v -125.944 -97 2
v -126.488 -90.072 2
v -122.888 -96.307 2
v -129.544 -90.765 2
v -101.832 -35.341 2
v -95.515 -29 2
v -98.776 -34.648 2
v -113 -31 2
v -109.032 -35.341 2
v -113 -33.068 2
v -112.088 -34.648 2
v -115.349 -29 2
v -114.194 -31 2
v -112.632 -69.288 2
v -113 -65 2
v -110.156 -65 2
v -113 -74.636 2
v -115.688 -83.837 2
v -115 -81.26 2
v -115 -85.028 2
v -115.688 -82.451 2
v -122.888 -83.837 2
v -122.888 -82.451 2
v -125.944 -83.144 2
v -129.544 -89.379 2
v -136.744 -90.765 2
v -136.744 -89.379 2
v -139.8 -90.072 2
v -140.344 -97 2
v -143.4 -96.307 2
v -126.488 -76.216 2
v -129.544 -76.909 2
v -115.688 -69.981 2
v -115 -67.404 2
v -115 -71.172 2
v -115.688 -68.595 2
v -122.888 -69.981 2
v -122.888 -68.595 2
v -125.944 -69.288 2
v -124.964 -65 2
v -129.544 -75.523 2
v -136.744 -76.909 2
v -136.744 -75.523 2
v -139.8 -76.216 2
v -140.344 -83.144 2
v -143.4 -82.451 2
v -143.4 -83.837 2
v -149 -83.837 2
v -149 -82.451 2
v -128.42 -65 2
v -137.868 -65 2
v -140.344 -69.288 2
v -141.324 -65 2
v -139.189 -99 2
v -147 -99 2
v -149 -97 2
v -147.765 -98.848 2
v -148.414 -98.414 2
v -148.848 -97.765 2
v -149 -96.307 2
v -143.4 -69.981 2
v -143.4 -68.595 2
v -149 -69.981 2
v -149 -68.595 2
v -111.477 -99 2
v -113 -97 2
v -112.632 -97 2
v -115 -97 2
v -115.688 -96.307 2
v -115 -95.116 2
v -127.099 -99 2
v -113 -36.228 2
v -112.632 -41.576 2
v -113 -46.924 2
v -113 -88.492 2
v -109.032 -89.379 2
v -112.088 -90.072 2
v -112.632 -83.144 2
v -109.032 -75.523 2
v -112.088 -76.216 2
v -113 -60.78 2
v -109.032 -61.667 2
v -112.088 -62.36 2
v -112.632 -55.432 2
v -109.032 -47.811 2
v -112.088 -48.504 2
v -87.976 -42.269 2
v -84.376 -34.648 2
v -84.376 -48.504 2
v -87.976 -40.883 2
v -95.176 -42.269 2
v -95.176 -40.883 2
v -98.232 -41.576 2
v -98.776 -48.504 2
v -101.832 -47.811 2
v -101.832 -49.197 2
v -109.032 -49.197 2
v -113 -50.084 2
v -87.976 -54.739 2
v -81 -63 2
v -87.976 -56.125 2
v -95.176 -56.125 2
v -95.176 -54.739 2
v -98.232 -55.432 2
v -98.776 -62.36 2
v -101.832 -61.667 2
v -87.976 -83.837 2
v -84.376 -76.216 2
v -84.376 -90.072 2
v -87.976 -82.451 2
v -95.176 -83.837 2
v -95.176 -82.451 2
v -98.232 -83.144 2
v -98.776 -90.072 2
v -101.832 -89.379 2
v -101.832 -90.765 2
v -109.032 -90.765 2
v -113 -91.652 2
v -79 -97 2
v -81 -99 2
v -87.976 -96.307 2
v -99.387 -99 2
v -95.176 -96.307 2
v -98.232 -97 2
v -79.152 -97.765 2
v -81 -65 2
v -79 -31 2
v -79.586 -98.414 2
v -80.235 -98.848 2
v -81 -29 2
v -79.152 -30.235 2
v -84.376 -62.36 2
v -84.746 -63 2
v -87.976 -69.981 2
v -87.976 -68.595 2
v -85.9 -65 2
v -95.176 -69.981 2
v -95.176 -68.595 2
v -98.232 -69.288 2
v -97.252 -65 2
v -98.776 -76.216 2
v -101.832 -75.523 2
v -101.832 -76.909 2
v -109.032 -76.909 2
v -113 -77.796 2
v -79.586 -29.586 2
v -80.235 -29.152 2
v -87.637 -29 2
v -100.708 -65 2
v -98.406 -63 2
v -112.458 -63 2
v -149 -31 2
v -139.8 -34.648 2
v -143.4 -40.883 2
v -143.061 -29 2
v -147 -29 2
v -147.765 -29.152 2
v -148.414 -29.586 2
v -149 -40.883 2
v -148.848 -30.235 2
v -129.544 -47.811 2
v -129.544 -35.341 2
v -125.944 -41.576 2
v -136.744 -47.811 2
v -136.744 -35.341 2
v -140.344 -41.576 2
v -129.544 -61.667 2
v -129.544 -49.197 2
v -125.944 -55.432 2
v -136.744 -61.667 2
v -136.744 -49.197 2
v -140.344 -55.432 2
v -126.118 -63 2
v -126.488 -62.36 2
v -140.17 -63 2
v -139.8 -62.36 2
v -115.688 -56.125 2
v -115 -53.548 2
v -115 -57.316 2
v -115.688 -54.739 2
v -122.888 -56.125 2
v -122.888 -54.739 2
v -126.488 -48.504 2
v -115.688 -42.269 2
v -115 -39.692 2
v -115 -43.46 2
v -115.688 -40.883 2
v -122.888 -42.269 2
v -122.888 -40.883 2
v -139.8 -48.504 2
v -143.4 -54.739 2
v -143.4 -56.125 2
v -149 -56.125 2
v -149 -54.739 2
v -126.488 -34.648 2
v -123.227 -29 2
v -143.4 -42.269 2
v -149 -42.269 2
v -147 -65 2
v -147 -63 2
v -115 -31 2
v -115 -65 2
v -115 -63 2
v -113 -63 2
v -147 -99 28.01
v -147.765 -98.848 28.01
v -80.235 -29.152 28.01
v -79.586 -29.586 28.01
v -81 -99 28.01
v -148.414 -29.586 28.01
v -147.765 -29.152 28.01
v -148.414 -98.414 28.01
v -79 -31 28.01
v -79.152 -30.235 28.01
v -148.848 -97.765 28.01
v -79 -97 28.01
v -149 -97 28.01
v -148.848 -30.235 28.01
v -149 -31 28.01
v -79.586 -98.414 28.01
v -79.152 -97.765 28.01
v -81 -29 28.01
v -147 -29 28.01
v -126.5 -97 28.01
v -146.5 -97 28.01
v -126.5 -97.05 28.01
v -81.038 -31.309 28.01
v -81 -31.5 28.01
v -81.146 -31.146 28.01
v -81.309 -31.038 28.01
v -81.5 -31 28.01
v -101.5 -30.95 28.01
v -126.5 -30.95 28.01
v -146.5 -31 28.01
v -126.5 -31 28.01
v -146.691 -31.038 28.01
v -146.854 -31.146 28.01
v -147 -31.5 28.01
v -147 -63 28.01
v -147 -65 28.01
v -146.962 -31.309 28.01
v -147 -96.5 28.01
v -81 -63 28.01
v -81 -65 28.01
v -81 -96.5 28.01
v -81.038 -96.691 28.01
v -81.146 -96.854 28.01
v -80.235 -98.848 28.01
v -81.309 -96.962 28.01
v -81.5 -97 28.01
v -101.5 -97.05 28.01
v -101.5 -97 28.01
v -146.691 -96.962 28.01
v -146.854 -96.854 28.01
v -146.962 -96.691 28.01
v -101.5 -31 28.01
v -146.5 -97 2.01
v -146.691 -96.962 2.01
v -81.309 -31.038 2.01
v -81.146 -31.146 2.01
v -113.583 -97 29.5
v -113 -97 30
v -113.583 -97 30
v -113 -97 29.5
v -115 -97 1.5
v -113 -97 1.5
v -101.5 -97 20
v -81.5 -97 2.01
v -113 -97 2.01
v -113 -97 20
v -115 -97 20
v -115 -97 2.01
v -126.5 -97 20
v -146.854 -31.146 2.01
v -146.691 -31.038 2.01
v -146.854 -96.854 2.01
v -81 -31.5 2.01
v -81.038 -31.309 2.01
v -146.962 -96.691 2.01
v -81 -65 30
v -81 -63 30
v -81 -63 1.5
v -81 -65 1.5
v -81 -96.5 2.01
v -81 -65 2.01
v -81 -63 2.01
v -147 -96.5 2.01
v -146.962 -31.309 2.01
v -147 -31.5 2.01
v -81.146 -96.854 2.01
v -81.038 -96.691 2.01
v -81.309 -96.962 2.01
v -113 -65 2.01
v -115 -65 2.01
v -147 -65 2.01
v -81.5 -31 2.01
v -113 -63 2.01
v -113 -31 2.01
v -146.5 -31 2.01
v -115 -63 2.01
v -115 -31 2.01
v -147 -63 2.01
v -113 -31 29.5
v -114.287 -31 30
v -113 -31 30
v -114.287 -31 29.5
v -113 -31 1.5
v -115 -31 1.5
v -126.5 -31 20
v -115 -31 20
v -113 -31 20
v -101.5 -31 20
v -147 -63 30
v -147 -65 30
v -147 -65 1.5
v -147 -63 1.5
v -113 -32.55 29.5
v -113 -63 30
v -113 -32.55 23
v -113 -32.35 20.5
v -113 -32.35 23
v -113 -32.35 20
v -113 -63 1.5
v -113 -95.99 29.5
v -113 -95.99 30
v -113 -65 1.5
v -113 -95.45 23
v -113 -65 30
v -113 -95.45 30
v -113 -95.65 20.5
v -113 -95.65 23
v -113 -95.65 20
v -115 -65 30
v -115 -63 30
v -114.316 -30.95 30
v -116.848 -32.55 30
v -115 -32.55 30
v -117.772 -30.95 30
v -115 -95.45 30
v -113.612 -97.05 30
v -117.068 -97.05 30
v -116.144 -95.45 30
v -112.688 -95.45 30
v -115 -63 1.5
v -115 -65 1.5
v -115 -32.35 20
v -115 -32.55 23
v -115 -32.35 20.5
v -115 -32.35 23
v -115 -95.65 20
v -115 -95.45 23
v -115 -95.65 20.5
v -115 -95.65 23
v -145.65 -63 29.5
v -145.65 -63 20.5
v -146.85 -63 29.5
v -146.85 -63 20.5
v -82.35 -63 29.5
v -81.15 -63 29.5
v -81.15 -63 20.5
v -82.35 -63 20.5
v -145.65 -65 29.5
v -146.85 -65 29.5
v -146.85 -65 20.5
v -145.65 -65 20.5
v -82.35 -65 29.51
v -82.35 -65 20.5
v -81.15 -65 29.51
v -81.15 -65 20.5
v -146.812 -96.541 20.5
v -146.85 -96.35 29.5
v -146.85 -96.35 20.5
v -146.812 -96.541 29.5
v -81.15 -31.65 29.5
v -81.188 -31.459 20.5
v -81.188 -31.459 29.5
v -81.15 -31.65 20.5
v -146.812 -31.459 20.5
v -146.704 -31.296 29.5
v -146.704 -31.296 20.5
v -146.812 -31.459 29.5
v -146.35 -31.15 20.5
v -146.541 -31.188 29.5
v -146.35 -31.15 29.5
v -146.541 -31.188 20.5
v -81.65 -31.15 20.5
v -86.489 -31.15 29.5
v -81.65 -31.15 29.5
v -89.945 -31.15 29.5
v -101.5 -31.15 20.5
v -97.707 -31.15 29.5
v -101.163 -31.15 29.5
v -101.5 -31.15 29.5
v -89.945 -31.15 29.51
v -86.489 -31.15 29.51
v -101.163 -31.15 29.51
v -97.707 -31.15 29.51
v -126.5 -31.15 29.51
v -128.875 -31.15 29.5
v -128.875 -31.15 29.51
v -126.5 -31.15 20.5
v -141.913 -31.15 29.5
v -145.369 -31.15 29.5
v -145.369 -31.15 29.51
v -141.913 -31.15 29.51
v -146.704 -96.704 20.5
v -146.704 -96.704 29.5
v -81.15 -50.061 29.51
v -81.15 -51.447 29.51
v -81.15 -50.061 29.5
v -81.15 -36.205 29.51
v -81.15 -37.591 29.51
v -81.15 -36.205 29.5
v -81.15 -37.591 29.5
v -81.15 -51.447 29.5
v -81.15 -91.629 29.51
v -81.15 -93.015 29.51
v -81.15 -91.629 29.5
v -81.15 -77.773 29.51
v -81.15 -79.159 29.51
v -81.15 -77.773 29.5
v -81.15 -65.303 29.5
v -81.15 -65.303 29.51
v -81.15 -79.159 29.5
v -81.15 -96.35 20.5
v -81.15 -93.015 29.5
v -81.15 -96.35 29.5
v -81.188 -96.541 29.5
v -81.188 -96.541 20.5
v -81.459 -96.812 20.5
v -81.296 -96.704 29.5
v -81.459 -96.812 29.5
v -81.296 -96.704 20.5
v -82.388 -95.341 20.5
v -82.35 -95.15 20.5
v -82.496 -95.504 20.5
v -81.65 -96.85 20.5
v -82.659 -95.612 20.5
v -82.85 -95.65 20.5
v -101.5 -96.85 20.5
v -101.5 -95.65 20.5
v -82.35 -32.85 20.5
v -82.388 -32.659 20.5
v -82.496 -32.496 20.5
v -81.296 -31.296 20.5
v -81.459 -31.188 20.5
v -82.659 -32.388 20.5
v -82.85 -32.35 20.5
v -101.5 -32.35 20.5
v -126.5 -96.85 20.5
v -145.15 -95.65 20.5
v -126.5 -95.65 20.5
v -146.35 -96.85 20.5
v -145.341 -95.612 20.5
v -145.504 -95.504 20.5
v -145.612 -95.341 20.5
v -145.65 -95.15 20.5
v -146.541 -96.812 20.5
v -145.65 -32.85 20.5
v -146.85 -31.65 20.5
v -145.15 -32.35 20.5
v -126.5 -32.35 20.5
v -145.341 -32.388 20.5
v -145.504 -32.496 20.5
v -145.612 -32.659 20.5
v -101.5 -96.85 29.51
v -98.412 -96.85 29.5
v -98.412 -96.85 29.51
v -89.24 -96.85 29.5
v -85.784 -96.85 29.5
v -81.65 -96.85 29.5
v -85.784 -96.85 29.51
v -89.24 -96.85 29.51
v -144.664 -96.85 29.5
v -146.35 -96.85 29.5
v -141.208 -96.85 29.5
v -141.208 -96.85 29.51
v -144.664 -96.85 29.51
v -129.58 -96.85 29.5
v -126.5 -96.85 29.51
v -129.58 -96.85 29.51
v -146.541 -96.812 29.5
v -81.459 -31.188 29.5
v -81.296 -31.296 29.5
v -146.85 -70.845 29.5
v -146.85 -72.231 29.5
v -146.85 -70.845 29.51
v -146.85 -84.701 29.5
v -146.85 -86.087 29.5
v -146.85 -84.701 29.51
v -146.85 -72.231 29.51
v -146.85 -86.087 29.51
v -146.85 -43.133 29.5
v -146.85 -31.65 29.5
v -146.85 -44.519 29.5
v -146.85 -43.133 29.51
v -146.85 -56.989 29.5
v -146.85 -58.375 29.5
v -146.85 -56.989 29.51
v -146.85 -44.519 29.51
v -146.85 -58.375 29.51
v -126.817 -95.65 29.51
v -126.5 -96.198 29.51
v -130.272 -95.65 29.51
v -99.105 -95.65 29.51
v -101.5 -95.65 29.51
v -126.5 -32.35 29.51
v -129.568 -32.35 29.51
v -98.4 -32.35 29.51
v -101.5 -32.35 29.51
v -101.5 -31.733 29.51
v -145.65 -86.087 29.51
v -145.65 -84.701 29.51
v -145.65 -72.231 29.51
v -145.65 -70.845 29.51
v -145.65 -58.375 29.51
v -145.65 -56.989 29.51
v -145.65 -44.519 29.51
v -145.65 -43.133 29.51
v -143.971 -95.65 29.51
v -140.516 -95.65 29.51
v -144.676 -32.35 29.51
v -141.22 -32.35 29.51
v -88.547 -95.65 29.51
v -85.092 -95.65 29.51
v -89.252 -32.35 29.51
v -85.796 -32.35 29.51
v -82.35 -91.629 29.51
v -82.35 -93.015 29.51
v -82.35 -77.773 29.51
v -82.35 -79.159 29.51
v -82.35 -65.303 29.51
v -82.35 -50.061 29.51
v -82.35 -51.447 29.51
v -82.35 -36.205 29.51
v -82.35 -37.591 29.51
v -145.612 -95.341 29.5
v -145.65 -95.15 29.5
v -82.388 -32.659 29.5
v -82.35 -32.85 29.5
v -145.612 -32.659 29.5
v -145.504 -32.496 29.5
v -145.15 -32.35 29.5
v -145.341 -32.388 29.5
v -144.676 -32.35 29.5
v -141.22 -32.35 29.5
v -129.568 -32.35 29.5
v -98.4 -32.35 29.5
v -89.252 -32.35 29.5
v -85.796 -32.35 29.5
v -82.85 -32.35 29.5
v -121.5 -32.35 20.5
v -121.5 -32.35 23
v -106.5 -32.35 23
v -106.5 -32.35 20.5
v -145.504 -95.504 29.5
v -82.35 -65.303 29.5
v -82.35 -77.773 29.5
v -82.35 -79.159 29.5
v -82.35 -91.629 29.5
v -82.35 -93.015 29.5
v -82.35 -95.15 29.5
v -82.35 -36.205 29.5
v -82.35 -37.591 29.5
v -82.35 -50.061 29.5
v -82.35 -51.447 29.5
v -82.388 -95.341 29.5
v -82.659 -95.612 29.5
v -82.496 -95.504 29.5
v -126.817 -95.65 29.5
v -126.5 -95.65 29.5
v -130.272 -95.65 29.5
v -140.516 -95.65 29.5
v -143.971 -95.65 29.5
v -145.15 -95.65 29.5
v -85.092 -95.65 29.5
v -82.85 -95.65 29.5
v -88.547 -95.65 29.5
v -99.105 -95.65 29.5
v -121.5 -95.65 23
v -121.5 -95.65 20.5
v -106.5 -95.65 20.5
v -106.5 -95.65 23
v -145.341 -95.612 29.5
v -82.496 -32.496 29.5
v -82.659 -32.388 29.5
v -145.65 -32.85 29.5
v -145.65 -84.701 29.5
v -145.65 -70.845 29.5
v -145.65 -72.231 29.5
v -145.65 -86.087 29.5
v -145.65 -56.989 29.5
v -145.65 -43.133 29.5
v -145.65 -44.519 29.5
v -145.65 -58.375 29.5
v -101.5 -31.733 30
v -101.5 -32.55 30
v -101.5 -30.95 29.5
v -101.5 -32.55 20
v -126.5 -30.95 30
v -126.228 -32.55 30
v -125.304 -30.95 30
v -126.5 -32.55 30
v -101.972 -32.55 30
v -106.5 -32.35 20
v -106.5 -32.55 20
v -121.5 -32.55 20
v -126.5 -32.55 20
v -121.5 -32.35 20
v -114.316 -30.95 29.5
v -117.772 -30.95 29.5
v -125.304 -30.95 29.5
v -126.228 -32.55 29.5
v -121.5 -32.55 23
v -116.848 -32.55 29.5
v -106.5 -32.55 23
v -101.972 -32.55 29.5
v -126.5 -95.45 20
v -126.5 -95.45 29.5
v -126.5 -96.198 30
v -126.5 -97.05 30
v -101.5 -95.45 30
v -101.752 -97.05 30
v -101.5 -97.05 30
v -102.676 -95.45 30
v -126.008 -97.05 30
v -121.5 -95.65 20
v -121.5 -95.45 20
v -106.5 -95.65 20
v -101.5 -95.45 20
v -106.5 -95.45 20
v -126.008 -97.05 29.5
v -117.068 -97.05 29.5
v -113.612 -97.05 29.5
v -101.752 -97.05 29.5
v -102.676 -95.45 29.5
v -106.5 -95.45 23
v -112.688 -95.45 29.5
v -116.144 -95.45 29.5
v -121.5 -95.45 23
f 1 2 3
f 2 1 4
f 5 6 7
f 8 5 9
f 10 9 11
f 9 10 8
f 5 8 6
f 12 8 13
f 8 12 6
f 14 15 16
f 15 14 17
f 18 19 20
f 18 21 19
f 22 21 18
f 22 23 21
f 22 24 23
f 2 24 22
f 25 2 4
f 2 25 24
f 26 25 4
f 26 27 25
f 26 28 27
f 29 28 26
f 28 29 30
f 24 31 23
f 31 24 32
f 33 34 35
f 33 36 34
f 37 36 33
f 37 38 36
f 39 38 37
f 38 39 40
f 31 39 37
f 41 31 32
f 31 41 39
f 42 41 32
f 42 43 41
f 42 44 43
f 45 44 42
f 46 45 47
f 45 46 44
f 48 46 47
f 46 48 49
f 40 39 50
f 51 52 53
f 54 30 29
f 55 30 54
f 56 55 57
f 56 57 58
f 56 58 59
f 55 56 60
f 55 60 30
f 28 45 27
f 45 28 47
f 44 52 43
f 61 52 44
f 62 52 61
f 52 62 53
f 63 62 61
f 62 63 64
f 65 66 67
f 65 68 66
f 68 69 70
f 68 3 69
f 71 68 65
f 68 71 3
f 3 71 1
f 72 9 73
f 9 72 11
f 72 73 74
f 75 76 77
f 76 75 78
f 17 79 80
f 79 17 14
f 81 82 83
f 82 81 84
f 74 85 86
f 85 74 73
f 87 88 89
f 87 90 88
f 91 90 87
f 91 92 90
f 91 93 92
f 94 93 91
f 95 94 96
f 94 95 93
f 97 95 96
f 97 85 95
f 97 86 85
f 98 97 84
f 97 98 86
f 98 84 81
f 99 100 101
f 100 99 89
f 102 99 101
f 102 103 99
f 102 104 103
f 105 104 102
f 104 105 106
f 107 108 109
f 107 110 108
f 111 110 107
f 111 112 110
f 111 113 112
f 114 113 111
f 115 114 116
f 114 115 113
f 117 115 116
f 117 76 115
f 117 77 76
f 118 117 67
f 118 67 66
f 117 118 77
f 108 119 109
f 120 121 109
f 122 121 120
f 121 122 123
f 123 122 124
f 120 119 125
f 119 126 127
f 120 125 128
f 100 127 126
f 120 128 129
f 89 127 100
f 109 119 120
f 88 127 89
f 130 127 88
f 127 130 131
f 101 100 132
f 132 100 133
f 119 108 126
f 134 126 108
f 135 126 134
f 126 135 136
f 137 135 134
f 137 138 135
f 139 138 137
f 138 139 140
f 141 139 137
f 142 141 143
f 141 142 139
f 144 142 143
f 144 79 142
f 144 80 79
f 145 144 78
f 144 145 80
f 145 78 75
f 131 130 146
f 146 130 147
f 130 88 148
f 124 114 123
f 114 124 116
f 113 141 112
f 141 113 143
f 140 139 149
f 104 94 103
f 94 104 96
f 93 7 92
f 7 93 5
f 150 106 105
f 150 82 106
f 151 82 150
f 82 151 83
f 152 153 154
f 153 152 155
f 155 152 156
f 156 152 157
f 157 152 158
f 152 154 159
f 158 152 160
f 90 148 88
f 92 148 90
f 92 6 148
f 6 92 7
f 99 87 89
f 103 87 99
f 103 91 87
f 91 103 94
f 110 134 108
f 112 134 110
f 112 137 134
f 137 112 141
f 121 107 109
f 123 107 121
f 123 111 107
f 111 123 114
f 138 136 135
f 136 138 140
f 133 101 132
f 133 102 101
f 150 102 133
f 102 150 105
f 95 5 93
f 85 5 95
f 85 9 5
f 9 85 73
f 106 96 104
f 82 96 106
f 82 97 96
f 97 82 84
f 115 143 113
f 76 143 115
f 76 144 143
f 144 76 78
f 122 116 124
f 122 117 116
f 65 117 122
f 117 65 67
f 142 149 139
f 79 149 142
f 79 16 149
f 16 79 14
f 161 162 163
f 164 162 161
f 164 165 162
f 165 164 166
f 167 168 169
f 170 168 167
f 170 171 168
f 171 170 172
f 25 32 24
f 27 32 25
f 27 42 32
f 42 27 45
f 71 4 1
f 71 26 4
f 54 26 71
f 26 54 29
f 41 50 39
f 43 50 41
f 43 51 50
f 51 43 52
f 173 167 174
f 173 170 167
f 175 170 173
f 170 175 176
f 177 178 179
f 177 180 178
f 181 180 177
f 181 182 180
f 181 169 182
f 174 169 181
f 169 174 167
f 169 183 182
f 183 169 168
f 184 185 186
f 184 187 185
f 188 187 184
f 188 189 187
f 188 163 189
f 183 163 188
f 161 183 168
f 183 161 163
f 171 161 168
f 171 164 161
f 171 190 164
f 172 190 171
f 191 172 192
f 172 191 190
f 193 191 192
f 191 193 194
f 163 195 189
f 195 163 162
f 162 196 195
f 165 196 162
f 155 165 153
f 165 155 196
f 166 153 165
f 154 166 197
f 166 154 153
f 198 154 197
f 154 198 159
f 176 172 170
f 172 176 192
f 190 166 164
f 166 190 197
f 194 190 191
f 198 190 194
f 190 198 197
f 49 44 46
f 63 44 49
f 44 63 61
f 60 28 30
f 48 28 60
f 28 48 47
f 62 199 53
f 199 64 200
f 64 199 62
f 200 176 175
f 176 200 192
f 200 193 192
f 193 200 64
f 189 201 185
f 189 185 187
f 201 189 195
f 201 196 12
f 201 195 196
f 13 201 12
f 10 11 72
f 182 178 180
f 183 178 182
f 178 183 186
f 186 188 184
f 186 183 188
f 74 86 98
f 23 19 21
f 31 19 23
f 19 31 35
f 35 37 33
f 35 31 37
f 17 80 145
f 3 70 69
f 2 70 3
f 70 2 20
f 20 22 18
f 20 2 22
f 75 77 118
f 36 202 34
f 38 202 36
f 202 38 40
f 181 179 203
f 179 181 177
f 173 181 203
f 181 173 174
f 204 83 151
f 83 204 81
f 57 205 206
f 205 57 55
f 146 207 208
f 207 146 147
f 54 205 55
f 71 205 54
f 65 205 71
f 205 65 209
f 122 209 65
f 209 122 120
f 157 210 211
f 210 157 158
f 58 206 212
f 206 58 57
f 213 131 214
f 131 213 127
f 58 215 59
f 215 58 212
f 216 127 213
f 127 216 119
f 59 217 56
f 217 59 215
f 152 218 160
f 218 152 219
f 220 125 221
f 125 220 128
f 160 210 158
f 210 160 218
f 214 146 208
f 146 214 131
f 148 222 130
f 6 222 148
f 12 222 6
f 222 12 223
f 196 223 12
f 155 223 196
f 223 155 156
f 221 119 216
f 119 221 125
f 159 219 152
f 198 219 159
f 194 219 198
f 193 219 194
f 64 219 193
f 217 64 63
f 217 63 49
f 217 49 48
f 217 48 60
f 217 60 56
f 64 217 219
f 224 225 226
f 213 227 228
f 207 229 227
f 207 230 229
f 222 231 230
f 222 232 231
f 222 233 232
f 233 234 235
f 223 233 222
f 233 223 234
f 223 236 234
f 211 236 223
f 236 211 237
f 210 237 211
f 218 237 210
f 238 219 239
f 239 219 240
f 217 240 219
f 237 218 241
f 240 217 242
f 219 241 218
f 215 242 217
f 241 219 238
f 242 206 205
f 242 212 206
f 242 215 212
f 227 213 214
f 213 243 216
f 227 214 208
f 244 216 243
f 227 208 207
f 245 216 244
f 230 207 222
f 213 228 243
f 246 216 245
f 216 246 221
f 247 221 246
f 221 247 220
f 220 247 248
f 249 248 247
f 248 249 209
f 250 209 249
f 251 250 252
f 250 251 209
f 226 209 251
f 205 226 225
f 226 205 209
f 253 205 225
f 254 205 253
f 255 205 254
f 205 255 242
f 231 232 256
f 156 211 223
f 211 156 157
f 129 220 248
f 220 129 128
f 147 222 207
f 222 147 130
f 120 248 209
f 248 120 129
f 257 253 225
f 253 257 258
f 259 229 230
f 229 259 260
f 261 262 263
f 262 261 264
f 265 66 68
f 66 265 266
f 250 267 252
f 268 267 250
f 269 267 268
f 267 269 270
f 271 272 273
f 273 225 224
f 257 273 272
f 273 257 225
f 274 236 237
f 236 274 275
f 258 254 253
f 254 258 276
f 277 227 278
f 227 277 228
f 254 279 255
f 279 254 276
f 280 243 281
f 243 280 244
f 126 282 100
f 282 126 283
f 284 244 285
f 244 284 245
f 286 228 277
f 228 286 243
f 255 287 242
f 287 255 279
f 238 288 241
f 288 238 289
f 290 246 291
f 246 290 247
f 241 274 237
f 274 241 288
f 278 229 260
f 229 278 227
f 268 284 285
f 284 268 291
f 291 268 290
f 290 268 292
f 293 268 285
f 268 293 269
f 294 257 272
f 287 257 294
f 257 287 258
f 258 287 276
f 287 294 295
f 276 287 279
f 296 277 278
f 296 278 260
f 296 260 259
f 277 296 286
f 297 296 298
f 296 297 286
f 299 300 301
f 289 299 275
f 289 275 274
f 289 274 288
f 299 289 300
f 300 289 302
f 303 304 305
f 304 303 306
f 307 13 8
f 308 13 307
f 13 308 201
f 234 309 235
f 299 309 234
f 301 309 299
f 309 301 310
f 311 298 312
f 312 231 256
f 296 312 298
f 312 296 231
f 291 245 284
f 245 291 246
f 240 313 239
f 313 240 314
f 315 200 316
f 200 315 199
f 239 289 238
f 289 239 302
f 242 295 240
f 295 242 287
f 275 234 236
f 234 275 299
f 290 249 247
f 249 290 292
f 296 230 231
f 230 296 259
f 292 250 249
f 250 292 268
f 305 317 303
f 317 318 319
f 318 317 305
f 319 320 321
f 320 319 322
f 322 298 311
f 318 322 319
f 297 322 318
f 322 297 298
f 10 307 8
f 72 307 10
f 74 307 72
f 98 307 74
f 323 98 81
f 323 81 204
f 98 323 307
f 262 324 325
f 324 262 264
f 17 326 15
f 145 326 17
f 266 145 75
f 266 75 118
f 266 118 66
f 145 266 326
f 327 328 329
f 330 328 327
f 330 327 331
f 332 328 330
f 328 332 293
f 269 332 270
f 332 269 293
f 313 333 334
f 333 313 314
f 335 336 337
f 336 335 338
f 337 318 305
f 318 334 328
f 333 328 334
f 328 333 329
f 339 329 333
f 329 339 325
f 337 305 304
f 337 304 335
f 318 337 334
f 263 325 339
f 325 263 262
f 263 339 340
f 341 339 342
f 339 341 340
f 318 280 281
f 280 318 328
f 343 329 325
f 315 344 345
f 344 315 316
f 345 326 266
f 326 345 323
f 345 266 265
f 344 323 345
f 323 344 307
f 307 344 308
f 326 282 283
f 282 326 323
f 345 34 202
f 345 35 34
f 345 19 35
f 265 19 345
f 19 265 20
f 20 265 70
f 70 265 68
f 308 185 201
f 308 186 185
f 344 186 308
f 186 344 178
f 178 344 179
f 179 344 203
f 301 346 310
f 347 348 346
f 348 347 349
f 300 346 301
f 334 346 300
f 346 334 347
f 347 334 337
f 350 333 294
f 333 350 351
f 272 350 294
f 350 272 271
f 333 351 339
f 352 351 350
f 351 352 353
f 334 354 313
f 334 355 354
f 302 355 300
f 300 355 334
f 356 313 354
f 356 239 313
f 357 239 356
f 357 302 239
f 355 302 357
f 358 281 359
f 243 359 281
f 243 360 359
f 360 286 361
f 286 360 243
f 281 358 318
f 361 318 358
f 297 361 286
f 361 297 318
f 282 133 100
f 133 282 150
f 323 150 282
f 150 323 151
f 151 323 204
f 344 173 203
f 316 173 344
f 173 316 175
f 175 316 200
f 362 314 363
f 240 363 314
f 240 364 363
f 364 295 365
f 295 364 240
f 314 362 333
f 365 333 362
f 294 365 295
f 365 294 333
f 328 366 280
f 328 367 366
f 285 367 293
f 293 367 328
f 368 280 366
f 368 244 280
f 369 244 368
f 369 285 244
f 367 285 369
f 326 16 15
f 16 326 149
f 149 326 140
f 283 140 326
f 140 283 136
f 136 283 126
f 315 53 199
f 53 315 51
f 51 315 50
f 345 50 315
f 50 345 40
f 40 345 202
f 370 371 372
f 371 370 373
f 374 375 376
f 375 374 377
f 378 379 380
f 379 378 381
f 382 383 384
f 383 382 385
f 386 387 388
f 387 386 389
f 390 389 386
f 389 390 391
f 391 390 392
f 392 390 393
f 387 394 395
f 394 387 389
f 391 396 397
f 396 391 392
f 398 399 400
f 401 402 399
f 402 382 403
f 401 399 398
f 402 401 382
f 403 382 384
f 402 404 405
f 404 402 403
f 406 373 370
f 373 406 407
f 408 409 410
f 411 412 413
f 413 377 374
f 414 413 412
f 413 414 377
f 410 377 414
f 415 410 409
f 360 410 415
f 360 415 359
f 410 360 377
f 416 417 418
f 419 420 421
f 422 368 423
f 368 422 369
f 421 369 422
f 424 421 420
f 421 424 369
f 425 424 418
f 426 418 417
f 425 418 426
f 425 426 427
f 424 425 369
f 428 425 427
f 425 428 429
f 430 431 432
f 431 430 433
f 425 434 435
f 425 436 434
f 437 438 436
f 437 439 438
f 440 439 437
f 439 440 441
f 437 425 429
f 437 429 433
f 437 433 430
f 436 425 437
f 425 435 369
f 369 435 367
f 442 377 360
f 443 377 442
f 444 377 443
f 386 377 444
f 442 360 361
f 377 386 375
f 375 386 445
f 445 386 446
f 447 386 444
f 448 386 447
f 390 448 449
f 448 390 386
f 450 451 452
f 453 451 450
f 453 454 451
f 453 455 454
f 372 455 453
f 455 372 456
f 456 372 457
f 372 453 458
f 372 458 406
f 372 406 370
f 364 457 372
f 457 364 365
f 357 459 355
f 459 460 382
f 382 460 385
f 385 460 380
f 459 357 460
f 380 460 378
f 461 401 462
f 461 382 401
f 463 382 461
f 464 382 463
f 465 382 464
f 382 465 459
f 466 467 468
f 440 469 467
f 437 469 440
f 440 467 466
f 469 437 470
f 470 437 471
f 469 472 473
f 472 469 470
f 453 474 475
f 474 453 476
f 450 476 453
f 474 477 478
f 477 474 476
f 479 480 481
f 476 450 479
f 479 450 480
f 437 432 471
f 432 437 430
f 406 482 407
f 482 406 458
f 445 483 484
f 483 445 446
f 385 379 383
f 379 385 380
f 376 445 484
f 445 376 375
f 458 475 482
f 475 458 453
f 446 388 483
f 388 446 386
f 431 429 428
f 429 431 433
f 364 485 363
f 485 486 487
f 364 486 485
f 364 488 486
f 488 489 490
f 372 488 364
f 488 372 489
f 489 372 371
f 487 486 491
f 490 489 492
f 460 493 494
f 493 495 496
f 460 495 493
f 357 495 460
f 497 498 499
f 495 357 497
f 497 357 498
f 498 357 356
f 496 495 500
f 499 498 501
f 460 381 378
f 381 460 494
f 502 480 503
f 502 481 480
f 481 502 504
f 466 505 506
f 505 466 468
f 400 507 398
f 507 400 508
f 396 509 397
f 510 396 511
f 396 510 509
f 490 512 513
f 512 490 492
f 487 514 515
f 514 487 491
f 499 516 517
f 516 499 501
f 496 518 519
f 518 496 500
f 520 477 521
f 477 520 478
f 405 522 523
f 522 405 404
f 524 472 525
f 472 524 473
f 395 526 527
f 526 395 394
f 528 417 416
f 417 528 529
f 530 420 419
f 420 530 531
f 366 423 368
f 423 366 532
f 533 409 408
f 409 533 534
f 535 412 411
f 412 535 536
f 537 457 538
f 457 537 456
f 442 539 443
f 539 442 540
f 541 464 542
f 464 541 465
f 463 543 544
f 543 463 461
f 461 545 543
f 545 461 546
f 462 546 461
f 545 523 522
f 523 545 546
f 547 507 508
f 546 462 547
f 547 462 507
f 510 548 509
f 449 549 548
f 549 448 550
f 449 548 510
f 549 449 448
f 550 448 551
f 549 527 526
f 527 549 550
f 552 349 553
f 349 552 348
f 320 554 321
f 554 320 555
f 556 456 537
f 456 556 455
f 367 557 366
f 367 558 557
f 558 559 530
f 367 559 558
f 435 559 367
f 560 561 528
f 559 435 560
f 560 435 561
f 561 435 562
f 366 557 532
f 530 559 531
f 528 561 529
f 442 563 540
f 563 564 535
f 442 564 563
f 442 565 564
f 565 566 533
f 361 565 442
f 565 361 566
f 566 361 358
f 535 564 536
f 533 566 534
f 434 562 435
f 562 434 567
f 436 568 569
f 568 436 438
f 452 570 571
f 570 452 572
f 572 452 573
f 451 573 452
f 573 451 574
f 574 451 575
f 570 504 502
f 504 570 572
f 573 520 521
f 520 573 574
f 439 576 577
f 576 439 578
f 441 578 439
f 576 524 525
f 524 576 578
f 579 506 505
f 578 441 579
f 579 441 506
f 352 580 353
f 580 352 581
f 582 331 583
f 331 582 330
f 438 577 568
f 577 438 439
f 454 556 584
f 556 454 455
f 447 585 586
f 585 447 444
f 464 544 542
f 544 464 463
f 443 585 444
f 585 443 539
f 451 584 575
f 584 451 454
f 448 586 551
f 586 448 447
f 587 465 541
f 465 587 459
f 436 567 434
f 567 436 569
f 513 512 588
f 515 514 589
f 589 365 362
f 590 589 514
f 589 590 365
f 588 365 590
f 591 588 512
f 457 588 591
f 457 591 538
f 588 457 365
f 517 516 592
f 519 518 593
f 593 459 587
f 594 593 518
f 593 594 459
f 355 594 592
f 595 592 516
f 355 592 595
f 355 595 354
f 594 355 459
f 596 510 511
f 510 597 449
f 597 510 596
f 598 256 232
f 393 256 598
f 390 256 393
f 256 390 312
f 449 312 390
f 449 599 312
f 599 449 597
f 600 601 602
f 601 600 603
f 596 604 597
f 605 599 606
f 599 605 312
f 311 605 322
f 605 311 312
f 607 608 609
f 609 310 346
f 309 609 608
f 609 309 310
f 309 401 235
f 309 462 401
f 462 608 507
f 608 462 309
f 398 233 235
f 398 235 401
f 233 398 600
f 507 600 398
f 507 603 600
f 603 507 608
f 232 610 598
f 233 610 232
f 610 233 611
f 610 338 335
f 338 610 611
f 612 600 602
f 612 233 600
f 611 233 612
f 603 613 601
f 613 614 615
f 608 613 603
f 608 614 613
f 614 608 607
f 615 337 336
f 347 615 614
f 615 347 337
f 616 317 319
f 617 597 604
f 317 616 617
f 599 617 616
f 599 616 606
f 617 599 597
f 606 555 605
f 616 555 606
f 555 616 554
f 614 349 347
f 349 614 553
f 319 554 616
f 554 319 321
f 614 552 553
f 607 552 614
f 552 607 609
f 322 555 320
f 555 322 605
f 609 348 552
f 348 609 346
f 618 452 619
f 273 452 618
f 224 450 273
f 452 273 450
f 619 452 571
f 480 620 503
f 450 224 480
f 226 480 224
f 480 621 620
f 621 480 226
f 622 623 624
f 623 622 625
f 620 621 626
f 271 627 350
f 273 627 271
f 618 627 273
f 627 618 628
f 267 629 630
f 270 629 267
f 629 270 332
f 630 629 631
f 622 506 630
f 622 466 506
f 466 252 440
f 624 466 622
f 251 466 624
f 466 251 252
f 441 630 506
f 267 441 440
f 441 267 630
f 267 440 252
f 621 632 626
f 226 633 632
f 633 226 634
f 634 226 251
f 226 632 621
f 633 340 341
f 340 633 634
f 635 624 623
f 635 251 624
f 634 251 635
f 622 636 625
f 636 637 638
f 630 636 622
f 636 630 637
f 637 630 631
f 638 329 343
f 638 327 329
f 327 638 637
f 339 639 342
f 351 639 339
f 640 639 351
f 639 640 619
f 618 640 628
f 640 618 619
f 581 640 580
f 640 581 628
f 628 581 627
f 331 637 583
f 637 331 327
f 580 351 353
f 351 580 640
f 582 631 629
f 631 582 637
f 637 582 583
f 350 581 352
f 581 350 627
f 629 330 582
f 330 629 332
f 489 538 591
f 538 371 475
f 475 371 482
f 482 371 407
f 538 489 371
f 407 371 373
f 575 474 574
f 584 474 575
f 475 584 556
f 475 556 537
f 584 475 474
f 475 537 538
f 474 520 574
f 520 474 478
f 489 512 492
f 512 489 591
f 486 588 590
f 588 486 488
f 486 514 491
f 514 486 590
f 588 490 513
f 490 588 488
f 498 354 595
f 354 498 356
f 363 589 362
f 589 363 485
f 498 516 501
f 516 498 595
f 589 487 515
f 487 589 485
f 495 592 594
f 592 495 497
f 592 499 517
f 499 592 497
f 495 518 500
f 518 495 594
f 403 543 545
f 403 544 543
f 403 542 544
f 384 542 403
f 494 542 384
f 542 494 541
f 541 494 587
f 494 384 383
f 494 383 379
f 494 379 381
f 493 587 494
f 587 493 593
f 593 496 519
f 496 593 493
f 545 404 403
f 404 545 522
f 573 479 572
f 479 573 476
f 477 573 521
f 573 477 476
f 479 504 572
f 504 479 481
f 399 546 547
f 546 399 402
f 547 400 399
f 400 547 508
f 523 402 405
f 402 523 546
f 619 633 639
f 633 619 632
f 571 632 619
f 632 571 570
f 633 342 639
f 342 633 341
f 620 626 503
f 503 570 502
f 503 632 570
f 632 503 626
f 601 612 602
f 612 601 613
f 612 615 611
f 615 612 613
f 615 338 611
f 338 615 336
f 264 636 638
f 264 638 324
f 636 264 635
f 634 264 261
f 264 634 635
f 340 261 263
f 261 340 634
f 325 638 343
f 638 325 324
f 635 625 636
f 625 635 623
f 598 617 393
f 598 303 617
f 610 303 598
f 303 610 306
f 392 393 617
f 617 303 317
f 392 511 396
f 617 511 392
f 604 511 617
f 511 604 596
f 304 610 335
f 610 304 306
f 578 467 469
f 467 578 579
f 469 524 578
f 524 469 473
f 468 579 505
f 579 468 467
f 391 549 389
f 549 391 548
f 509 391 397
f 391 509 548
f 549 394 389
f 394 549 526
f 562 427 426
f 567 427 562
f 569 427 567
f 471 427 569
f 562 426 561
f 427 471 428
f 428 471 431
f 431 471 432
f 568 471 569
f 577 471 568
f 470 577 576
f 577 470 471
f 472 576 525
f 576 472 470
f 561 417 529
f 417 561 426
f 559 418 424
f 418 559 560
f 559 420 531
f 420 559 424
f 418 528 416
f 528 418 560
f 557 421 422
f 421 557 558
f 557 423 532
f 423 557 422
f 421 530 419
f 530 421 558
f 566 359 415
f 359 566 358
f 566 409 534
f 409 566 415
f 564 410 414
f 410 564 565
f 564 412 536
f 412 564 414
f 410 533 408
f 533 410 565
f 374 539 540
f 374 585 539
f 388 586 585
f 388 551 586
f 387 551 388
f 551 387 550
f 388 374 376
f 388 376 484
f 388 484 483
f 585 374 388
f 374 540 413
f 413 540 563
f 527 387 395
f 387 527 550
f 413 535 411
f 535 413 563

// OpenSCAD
/*
 * Parametric Game Insert System v1.2.1 - STANDALONE VERSION
 *
 * This version works without BOSL2 dependencies
 * Compatible with MakerWorld and online OpenSCAD environments
 *
 * FEATURES:
 * - 8 container slots with full customization
 * - Per-container lids, hex floors, finger grips, stackable
 * - Multiple bin types: coin slots, token wells, small parts, card dividers
 * - Works in any OpenSCAD environment
 */

/* [Box Dimensions] */
box_width = 300; // [100:10:500]
box_depth = 200; // [100:10:500]
box_height = 75; // [30:5:200]

/* [Container Options] */
wall_thickness = 2.0; // [1.0:0.5:5.0]
floor_thickness = 1.5; // [0.8:0.1:4.0]
corner_radius = 2.0; // [0:0.5:10]
container_gap = 0.5; // [0:0.1:3.0]

/* [Global Hex Pattern Defaults] */
default_hex_floor = false;
default_hex_floor_size = 8; // [4:1:15]
default_hex_floor_wall = 0.8; // [0.4:0.1:2.0]

/* [Global Lid Defaults] */
default_lid_type = "snap"; // [snap:Snap-fit, friction:Friction-fit]
default_lid_tolerance = 0.3; // [0.1:0.05:0.8]
default_lid_thickness = 2.0; // [1.0:0.5:4.0]

/* [Container Slot 1] */
c1_enable = true;
c1_type = "token_tray"; // [card_holder, component_bin, dice_tray, token_tray]
c1_width = 70; // [30:5:200]
c1_depth = 70; // [30:5:200]
c1_height = 30; // [15:5:150]
c1_pos_x = 1; // [0:1:500]
c1_pos_y = 1; // [0:1:500]
c1_bin_type = "general"; // [general, coin_slot, token_well, small_parts, card_divider]
c1_comp_x = 2; // [1:1:12]
c1_comp_y = 2; // [1:1:12]
c1_divider = false;
c1_cutout = 25; // [0:5:60]
c1_lid = true;
c1_lid_hex = true;
c1_hex_floor = true;
c1_hex_walls = false;
c1_finger_grips = false;
c1_stackable = false;

/* [Container Slot 2] */
c2_enable = false;
c2_type = "component_bin"; // [card_holder, component_bin, dice_tray, token_tray]
c2_width = 90; // [30:5:200]
c2_depth = 90; // [30:5:200]
c2_height = 40; // [15:5:150]
c2_pos_x = 75; // [0:1:500]
c2_pos_y = 1; // [0:1:500]
c2_bin_type = "coin_slot"; // [general, coin_slot, token_well, small_parts, card_divider]
c2_comp_x = 6; // [1:1:12]
c2_comp_y = 2; // [1:1:12]
c2_divider = false;
c2_cutout = 0; // [0:5:60]
c2_lid = false;
c2_lid_hex = false;
c2_hex_walls = false;
c2_hex_floor = false;
c2_finger_grips = false;
c2_stackable = false;

/* [Container Slot 3] */
c3_enable = false;
c3_type = "token_tray"; // [card_holder, component_bin, dice_tray, token_tray]
c3_width = 70; // [30:5:200]
c3_depth = 70; // [30:5:200]
c3_height = 30; // [15:5:150]
c3_pos_x = 170; // [0:1:500]
c3_pos_y = 1; // [0:1:500]
c3_bin_type = "token_well"; // [general, coin_slot, token_well, small_parts, card_divider]
c3_comp_x = 3; // [1:1:12]
c3_comp_y = 3; // [1:1:12]
c3_divider = false;
c3_cutout = 0; // [0:5:60]
c3_lid = true;
c3_lid_hex = false;
c3_hex_walls = false;
c3_hex_floor = true;
c3_finger_grips = false;
c3_stackable = false;

/* [Container Slot 4] */
c4_enable = false;
c4_type = "card_holder"; // [card_holder, component_bin, dice_tray, token_tray]
c4_width = 70; // [30:5:200]
c4_depth = 95; // [30:5:200]
c4_height = 65; // [15:5:150]
c4_pos_x = 1; // [0:1:500]
c4_pos_y = 75; // [0:1:500]
c4_bin_type = "general"; // [general, coin_slot, token_well, small_parts, card_divider]
c4_comp_x = 1; // [1:1:12]
c4_comp_y = 1; // [1:1:12]
c4_divider = false;
c4_cutout = 30; // [0:5:60]
c4_lid = false;
c4_lid_hex = false;
c4_hex_walls = false;
c4_hex_floor = false;
c4_finger_grips = false;
c4_stackable = false;

/* [Container Slot 5] */
c5_enable = false;
c5_type = "component_bin"; // [card_holder, component_bin, dice_tray, token_tray]
c5_width = 90; // [30:5:200]
c5_depth = 70; // [30:5:200]
c5_height = 35; // [15:5:150]
c5_pos_x = 1; // [0:1:500]
c5_pos_y = 130; // [0:1:500]
c5_bin_type = "general"; // [general, coin_slot, token_well, small_parts, card_divider]
c5_comp_x = 3; // [1:1:12]
c5_comp_y = 2; // [1:1:12]
c5_divider = true;
c5_cutout = 0; // [0:5:60]
c5_lid = false;
c5_lid_hex = false;
c5_hex_walls = false;
c5_hex_floor = true;
c5_finger_grips = true;
c5_stackable = false;

/* [Container Slot 6] */
c6_enable = false;
c6_type = "dice_tray"; // [card_holder, component_bin, dice_tray, token_tray]
c6_width = 70; // [30:5:200]
c6_depth = 70; // [30:5:200]
c6_height = 25; // [15:5:150]
c6_pos_x = 95; // [0:1:500]
c6_pos_y = 130; // [0:1:500]
c6_bin_type = "general"; // [general, coin_slot, token_well, small_parts, card_divider]
c6_comp_x = 1; // [1:1:12]
c6_comp_y = 1; // [1:1:12]
c6_divider = false;
c6_cutout = 0; // [0:5:60]
c6_lid = true;
c6_lid_hex = false;
c6_hex_walls = false;
c6_hex_floor = true;
c6_finger_grips = false;
c6_stackable = false;

/* [Container Slot 7] */
c7_enable = false;
c7_type = "component_bin"; // [card_holder, component_bin, dice_tray, token_tray]
c7_width = 90; // [30:5:200]
c7_depth = 90; // [30:5:200]
c7_height = 30; // [15:5:150]
c7_pos_x = 170; // [0:1:500]
c7_pos_y = 75; // [0:1:500]
c7_bin_type = "small_parts"; // [general, coin_slot, token_well, small_parts, card_divider]
c7_comp_x = 4; // [1:1:12]
c7_comp_y = 3; // [1:1:12]
c7_divider = false;
c7_cutout = 0; // [0:5:60]
c7_lid = true;
c7_lid_hex = false;
c7_hex_walls = false;
c7_hex_floor = true;
c7_finger_grips = false;
c7_stackable = true;

/* [Container Slot 8] */
c8_enable = false;
c8_type = "token_tray"; // [card_holder, component_bin, dice_tray, token_tray]
c8_width = 65; // [30:5:200]
c8_depth = 65; // [30:5:200]
c8_height = 35; // [15:5:150]
c8_pos_x = 75; // [0:1:500]
c8_pos_y = 75; // [0:1:500]
c8_bin_type = "general"; // [general, coin_slot, token_well, small_parts, card_divider]
c8_comp_x = 4; // [1:1:12]
c8_comp_y = 4; // [1:1:12]
c8_divider = false;
c8_cutout = 0; // [0:5:60]
c8_lid = false;
c8_lid_hex = false;
c8_hex_walls = false;
c8_hex_floor = true;
c8_finger_grips = false;
c8_stackable = false;

/* [Display Options] */
show_validation = true;
exploded_view = 1.0; // [1.0:0.5:3.0]

/* [Advanced Global] */
top_chamfer = 0.5; // [0:0.1:2.0]
stack_tolerance = 0.3; // [0.1:0.1:1.0]

$fn = $preview ? 32 : 64;

//====================================
// STANDALONE HELPER MODULES
//====================================

// Rounded cube using minkowski (works everywhere)
module rcube(size, r=0) {
    if (r == 0) {
        cube(size, center=true);
    } else {
        minkowski() {
            cube([size[0]-2*r, size[1]-2*r, size[2]-2*r], center=true);
            cylinder(r=r, h=0.01, $fn=16);
        }
    }
}

// Simple cylinder
module simple_cyl(d, h) {
    cylinder(d=d, h=h, center=false);
}

// Hexagon pattern floor - standalone version
module hex_floor_standalone(width, depth, hex_size, wall_thick) {
    hex_spacing = hex_size * 1.732;

    difference() {
        // Solid base
        translate([0, 0, floor_thickness/2])
            cube([width, depth, floor_thickness], center=true);

        // Cut hexagons
        for (x = [-width/2 : hex_spacing : width/2]) {
            for (y = [-depth/2 : hex_spacing : depth/2]) {
                offset_y = (floor(x / hex_spacing) % 2 == 0) ? 0 : hex_spacing / 2;
                translate([x, y + offset_y, 0])
                    linear_extrude(height=floor_thickness + 1, center=true)
                        circle(r=hex_size - wall_thick, $fn=6);
            }
        }
    }
}

// Snap lid - standalone (solid top cover)
module snap_lid_standalone(width, depth, tolerance, thickness, use_hex) {
    wall_height = 10; // Walls extend down 10mm to fully contain items
    clip_thick = 1.2;

    difference() {
        union() {
            // SOLID TOP SURFACE - covers entire container opening
            translate([0, 0, thickness/2])
                rcube([width + 0.5, depth + 0.5, thickness], r=corner_radius);

            // Interior containment walls that extend down inside container rim
            translate([0, 0, -wall_height/2])
                difference() {
                    // Outer wall boundary
                    rcube([width - 2*wall_thickness - tolerance,
                           depth - 2*wall_thickness - tolerance,
                           wall_height], r=max(0.5, corner_radius - wall_thickness));

                    // Hollow interior to create walls
                    rcube([width - 2*wall_thickness - tolerance - 2*clip_thick,
                           depth - 2*wall_thickness - tolerance - 2*clip_thick,
                           wall_height + 1], r=max(0.5, corner_radius - wall_thickness - clip_thick));
                }

            // Snap clips on two opposite sides for secure attachment
            for (side = [0, 180]) {
                rotate([0, 0, side])
                    translate([0, (depth - 2*wall_thickness - tolerance) / 2 - clip_thick/2, -wall_height/2])
                        difference() {
                            cube([25, clip_thick + 0.4, wall_height], center=true);
                            // Small undercut for flexible snap action
                            translate([0, -clip_thick/2 - 0.2, -wall_height/2 + 1.5])
                                cube([15, 0.4, 3], center=true);
                        }
            }
        }

        // Finger grip cutout on top for easy removal
        translate([0, 0, thickness/2])
            rcube([35, 15, thickness + 1], r=4);

        // Hex pattern on lid top if enabled
        if (use_hex) {
            hex_spacing = default_hex_floor_size * 1.732;
            for (x = [-(width + 0.5)/2 : hex_spacing : (width + 0.5)/2]) {
                for (y = [-(depth + 0.5)/2 : hex_spacing : (depth + 0.5)/2]) {
                    offset_y = (floor(x / hex_spacing) % 2 == 0) ? 0 : hex_spacing / 2;
                    translate([x, y + offset_y, thickness/2])
                        linear_extrude(height=thickness + 1, center=true)
                            circle(r=default_hex_floor_size - default_hex_floor_wall, $fn=6);
                }
            }
        }
    }
}

// Friction lid - standalone (solid top cover)
module friction_lid_standalone(width, depth, tolerance, thickness, use_hex) {
    wall_height = 10; // Walls extend down 10mm to fully contain items
    wall_thick = 1.5;

    difference() {
        union() {
            // SOLID TOP SURFACE - covers entire container opening
            translate([0, 0, thickness/2])
                rcube([width + 0.5, depth + 0.5, thickness], r=corner_radius);

            // Interior containment walls with tight friction fit
            translate([0, 0, -wall_height/2])
                difference() {
                    // Outer wall boundary (slightly tighter fit than snap lid)
                    rcube([width - 2*wall_thickness - tolerance/2,
                           depth - 2*wall_thickness - tolerance/2,
                           wall_height], r=max(0.5, corner_radius - wall_thickness));

                    // Hollow interior to create walls
                    rcube([width - 2*wall_thickness - tolerance/2 - 2*wall_thick,
                           depth - 2*wall_thickness - tolerance/2 - 2*wall_thick,
                           wall_height + 1], r=max(0.5, corner_radius - wall_thickness - wall_thick));
                }
        }

        // Finger grip cutout on top for easy removal
        translate([0, 0, thickness/2])
            rcube([35, 15, thickness + 1], r=4);

        // Hex pattern on lid top if enabled
        if (use_hex) {
            hex_spacing = default_hex_floor_size * 1.732;
            for (x = [-(width + 0.5)/2 : hex_spacing : (width + 0.5)/2]) {
                for (y = [-(depth + 0.5)/2 : hex_spacing : (depth + 0.5)/2]) {
                    offset_y = (floor(x / hex_spacing) % 2 == 0) ? 0 : hex_spacing / 2;
                    translate([x, y + offset_y, thickness/2])
                        linear_extrude(height=thickness + 1, center=true)
                            circle(r=default_hex_floor_size - default_hex_floor_wall, $fn=6);
                }
            }
        }
    }
}

// Main container box - standalone
module container_box_standalone(width, depth, height, finger_cutout, use_hex_floor, use_hex_walls, use_finger_grips, use_stackable) {
    difference() {
        // Outer box (walls + floor)
        translate([0, 0, height/2])
            rcube([width, depth, height], r=corner_radius);

        // Interior cavity - cut from top of floor to top of container
        translate([0, 0, floor_thickness + (height - floor_thickness)/2 + 0.01])
            rcube([width - 2*wall_thickness,
                   depth - 2*wall_thickness,
                   height - floor_thickness], r=max(0.5, corner_radius - wall_thickness));

        // Top chamfer
        if (top_chamfer > 0) {
            translate([0, 0, height - top_chamfer/2])
                rcube([width - 2*wall_thickness + 2*top_chamfer,
                       depth - 2*wall_thickness + 2*top_chamfer,
                       top_chamfer], r=top_chamfer/2);
        }

        // Finger cutout
        if (finger_cutout > 0) {
            translate([0, depth/2 - wall_thickness, height - finger_cutout/2])
                rotate([90, 0, 0])
                    cylinder(d=finger_cutout, h=wall_thickness*3);
        }

        // Cut hex pattern holes into floor if enabled
        if (use_hex_floor) {
            hex_spacing = default_hex_floor_size * 1.732;
            for (x = [-(width - 2*wall_thickness)/2 : hex_spacing : (width - 2*wall_thickness)/2]) {
                for (y = [-(depth - 2*wall_thickness)/2 : hex_spacing : (depth - 2*wall_thickness)/2]) {
                    offset_y = (floor(x / hex_spacing) % 2 == 0) ? 0 : hex_spacing / 2;
                    translate([x, y + offset_y, floor_thickness/2])
                        linear_extrude(height=floor_thickness + 1, center=true)
                            circle(r=default_hex_floor_size - default_hex_floor_wall, $fn=6);
                }
            }
        }

        // Cut hex pattern into walls if enabled
        if (use_hex_walls) {
            hex_spacing = default_hex_floor_size * 1.732;
            wall_hex_height = height - floor_thickness - 2; // Leave top and bottom solid

            // Front and back walls
            for (side = [0, 1]) {
                y_pos = side == 0 ? -depth/2 : depth/2;
                for (x = [-(width - 2*wall_thickness)/2 : hex_spacing : (width - 2*wall_thickness)/2]) {
                    for (z = [floor_thickness + 3 : hex_spacing : height - 3]) {
                        translate([x, y_pos, z])
                            rotate([90, 0, 0])
                                linear_extrude(height=wall_thickness + 1, center=true)
                                    circle(r=default_hex_floor_size - default_hex_floor_wall, $fn=6);
                    }
                }
            }

            // Left and right walls
            for (side = [0, 1]) {
                x_pos = side == 0 ? -width/2 : width/2;
                for (y = [-(depth - 2*wall_thickness)/2 : hex_spacing : (depth - 2*wall_thickness)/2]) {
                    for (z = [floor_thickness + 3 : hex_spacing : height - 3]) {
                        offset_y = (floor(z / hex_spacing) % 2 == 0) ? 0 : hex_spacing / 2;
                        translate([x_pos, y + offset_y, z])
                            rotate([90, 0, 90])
                                linear_extrude(height=wall_thickness + 1, center=true)
                                    circle(r=default_hex_floor_size - default_hex_floor_wall, $fn=6);
                    }
                }
            }
        }
    }

    // Stackable rim
    if (use_stackable) {
        translate([0, 0, height + 1])
            difference() {
                rcube([width - stack_tolerance, depth - stack_tolerance, 2], r=corner_radius);
                rcube([width - 2*wall_thickness - stack_tolerance,
                       depth - 2*wall_thickness - stack_tolerance, 3],
                       r=max(0.5, corner_radius - wall_thickness));
            }
    }

    // Finger grips
    if (use_finger_grips) {
        for (side = [0, 180]) {
            rotate([0, 0, side])
                translate([0, depth/2, height/2])
                    rotate([90, 0, 0])
                        difference() {
                            cylinder(d=15, h=wall_thickness);
                            cylinder(d=12, h=wall_thickness*2, center=true);
                        }
        }
    }
}

// Card holder
module card_holder_standalone(w, d, h, cutout, hex_floor, hex_walls, grips, stackable) {
    container_box_standalone(w, d, h, cutout, hex_floor, hex_walls, grips, stackable);
}

// Token tray with dividers
module token_tray_standalone(w, d, h, comp_x, comp_y, hex_floor, hex_walls, grips, stackable) {
    container_box_standalone(w, d, h, 0, hex_floor, hex_walls, grips, stackable);

    int_width = w - 2*wall_thickness;
    int_depth = d - 2*wall_thickness;

    // Vertical dividers
    if (comp_x > 1) {
        for (i = [1:comp_x-1]) {
            translate([int_width * i / comp_x - int_width/2, 0, floor_thickness + (h - floor_thickness)/2])
                cube([wall_thickness, int_depth, h - floor_thickness], center=true);
        }
    }

    // Horizontal dividers
    if (comp_y > 1) {
        for (j = [1:comp_y-1]) {
            translate([0, int_depth * j / comp_y - int_depth/2, floor_thickness + (h - floor_thickness)/2])
                cube([int_width, wall_thickness, h - floor_thickness], center=true);
        }
    }
}

// Component bin with types
module component_bin_standalone(w, d, h, bin_type, num_slots, divider, hex_floor, hex_walls, grips, stackable) {
    container_box_standalone(w, d, h, 0, hex_floor, hex_walls, grips, stackable);

    int_width = w - 2*wall_thickness;
    int_depth = d - 2*wall_thickness;

    if (bin_type == "coin_slot") {
        // Vertical coin slots
        for (i = [1:num_slots-1]) {
            translate([int_width * i / num_slots - int_width/2, 0, floor_thickness + (h - floor_thickness)/2])
                cube([wall_thickness, int_depth, h - floor_thickness], center=true);
        }
    } else if (bin_type == "token_well") {
        // Circular token wells
        wells_per_row = ceil(sqrt(num_slots));
        well_diameter = min((w - 2*wall_thickness) / wells_per_row - 2,
                           (d - 2*wall_thickness) / wells_per_row - 2);

        for (i = [0:num_slots-1]) {
            x_pos = (i % wells_per_row) - (wells_per_row - 1) / 2;
            y_pos = floor(i / wells_per_row) - (ceil(num_slots / wells_per_row) - 1) / 2;

            translate([x_pos * (int_width / wells_per_row),
                       y_pos * (int_depth / ceil(num_slots / wells_per_row)),
                       floor_thickness])
                cylinder(d=well_diameter, h=h);
        }
    } else if (bin_type == "small_parts") {
        // 4x3 grid
        for (i = [1:3]) {
            translate([int_width * i / 4 - int_width/2, 0, floor_thickness + (h - floor_thickness)/2])
                cube([wall_thickness, int_depth, h - floor_thickness], center=true);
        }
        for (j = [1:2]) {
            translate([0, int_depth * j / 3 - int_depth/2, floor_thickness + (h - floor_thickness)/2])
                cube([int_width, wall_thickness, h - floor_thickness], center=true);
        }
    } else if (bin_type == "card_divider") {
        // Card dividers
        for (i = [1:num_slots-1]) {
            translate([int_width * i / num_slots - int_width/2, 0, floor_thickness + (h - floor_thickness)/2])
                cube([wall_thickness, int_depth, h - floor_thickness], center=true);
        }
    } else if (divider) {
        // Single center divider
        translate([0, 0, floor_thickness + (h - floor_thickness)/2])
            cube([wall_thickness, int_depth, h - floor_thickness], center=true);
    }
}

// Dice tray
module dice_tray_standalone(w, d, h, hex_floor, hex_walls, grips, stackable) {
    container_box_standalone(w, d, h, 0, hex_floor, hex_walls, grips, stackable);
}

//====================================
// LAYOUT & RENDERING
//====================================

function multi_layout() =
    let (
        containers = [
            if (c1_enable)
                [c1_type, c1_pos_x, c1_pos_y, c1_width, c1_depth, c1_height,
                 c1_comp_x, c1_comp_y, c1_bin_type, c1_divider, c1_cutout, c1_lid, c1_lid_hex,
                 c1_hex_floor, c1_hex_walls, c1_finger_grips, c1_stackable],
            if (c2_enable)
                [c2_type, c2_pos_x, c2_pos_y, c2_width, c2_depth, c2_height,
                 c2_comp_x, c2_comp_y, c2_bin_type, c2_divider, c2_cutout, c2_lid, c2_lid_hex,
                 c2_hex_floor, c2_hex_walls, c2_finger_grips, c2_stackable],
            if (c3_enable)
                [c3_type, c3_pos_x, c3_pos_y, c3_width, c3_depth, c3_height,
                 c3_comp_x, c3_comp_y, c3_bin_type, c3_divider, c3_cutout, c3_lid, c3_lid_hex,
                 c3_hex_floor, c3_hex_walls, c3_finger_grips, c3_stackable],
            if (c4_enable)
                [c4_type, c4_pos_x, c4_pos_y, c4_width, c4_depth, c4_height,
                 c4_comp_x, c4_comp_y, c4_bin_type, c4_divider, c4_cutout, c4_lid, c4_lid_hex,
                 c4_hex_floor, c4_hex_walls, c4_finger_grips, c4_stackable],
            if (c5_enable)
                [c5_type, c5_pos_x, c5_pos_y, c5_width, c5_depth, c5_height,
                 c5_comp_x, c5_comp_y, c5_bin_type, c5_divider, c5_cutout, c5_lid, c5_lid_hex,
                 c5_hex_floor, c5_hex_walls, c5_finger_grips, c5_stackable],
            if (c6_enable)
                [c6_type, c6_pos_x, c6_pos_y, c6_width, c6_depth, c6_height,
                 c6_comp_x, c6_comp_y, c6_bin_type, c6_divider, c6_cutout, c6_lid, c6_lid_hex,
                 c6_hex_floor, c6_hex_walls, c6_finger_grips, c6_stackable],
            if (c7_enable)
                [c7_type, c7_pos_x, c7_pos_y, c7_width, c7_depth, c7_height,
                 c7_comp_x, c7_comp_y, c7_bin_type, c7_divider, c7_cutout, c7_lid, c7_lid_hex,
                 c7_hex_floor, c7_hex_walls, c7_finger_grips, c7_stackable],
            if (c8_enable)
                [c8_type, c8_pos_x, c8_pos_y, c8_width, c8_depth, c8_height,
                 c8_comp_x, c8_comp_y, c8_bin_type, c8_divider, c8_cutout, c8_lid, c8_lid_hex,
                 c8_hex_floor, c8_hex_walls, c8_finger_grips, c8_stackable],
        ]
    )
    containers;

containers = multi_layout();

// Only render if there are containers
if (len(containers) > 0) {
    for (i = [0:len(containers)-1]) {
        c = containers[i];
        type = c[0];
        x = c[1];
        y = c[2];
        w = c[3];
        d = c[4];
        h = c[5];
        comp_x = c[6];
        comp_y = c[7];
        bin_type = c[8];
        divider = c[9];
        cutout = c[10];
        has_lid = c[11];
        lid_hex = c[12];
        hex_floor = c[13];
        hex_walls = c[14];
        grips = c[15];
        stackable = c[16];

        translate([x - box_width/2 + w/2, y - box_depth/2 + d/2, 0]) {
            if (type == "card_holder")
                card_holder_standalone(w, d, h, cutout, hex_floor, hex_walls, grips, stackable);
            else if (type == "component_bin")
                component_bin_standalone(w, d, h, bin_type, comp_x, divider, hex_floor, hex_walls, grips, stackable);
            else if (type == "dice_tray")
                dice_tray_standalone(w, d, h, hex_floor, hex_walls, grips, stackable);
            else if (type == "token_tray")
                token_tray_standalone(w, d, h, comp_x, comp_y, hex_floor, hex_walls, grips, stackable);

            // Lid
            if (has_lid) {
                translate([0, 0, h]) {
                    if (default_lid_type == "snap")
                        snap_lid_standalone(w, d, default_lid_tolerance, default_lid_thickness, lid_hex);
                    else
                        friction_lid_standalone(w, d, default_lid_tolerance, default_lid_thickness, lid_hex);
                }
            }
        }
    }

    // Box outline in preview
    if ($preview) {
        %translate([0, 0, box_height/2])
            cube([box_width, box_depth, box_height], center=true);
    }
} else {
    // Show message when no containers enabled
    echo("=== NO CONTAINERS ENABLED ===");
    echo("Enable at least one container slot (c1_enable, c2_enable, etc.)");

    // Show box outline
    if ($preview) {
        %translate([0, 0, box_height/2])
            cube([box_width, box_depth, box_height], center=true);
    }
}

echo("=== Parametric Game Insert v1.2.1 STANDALONE ===");
echo(str("Active containers: ", len(containers)));
if (len(containers) == 0) {
    echo("TIP: Enable container slots in the Customizer!");
}
